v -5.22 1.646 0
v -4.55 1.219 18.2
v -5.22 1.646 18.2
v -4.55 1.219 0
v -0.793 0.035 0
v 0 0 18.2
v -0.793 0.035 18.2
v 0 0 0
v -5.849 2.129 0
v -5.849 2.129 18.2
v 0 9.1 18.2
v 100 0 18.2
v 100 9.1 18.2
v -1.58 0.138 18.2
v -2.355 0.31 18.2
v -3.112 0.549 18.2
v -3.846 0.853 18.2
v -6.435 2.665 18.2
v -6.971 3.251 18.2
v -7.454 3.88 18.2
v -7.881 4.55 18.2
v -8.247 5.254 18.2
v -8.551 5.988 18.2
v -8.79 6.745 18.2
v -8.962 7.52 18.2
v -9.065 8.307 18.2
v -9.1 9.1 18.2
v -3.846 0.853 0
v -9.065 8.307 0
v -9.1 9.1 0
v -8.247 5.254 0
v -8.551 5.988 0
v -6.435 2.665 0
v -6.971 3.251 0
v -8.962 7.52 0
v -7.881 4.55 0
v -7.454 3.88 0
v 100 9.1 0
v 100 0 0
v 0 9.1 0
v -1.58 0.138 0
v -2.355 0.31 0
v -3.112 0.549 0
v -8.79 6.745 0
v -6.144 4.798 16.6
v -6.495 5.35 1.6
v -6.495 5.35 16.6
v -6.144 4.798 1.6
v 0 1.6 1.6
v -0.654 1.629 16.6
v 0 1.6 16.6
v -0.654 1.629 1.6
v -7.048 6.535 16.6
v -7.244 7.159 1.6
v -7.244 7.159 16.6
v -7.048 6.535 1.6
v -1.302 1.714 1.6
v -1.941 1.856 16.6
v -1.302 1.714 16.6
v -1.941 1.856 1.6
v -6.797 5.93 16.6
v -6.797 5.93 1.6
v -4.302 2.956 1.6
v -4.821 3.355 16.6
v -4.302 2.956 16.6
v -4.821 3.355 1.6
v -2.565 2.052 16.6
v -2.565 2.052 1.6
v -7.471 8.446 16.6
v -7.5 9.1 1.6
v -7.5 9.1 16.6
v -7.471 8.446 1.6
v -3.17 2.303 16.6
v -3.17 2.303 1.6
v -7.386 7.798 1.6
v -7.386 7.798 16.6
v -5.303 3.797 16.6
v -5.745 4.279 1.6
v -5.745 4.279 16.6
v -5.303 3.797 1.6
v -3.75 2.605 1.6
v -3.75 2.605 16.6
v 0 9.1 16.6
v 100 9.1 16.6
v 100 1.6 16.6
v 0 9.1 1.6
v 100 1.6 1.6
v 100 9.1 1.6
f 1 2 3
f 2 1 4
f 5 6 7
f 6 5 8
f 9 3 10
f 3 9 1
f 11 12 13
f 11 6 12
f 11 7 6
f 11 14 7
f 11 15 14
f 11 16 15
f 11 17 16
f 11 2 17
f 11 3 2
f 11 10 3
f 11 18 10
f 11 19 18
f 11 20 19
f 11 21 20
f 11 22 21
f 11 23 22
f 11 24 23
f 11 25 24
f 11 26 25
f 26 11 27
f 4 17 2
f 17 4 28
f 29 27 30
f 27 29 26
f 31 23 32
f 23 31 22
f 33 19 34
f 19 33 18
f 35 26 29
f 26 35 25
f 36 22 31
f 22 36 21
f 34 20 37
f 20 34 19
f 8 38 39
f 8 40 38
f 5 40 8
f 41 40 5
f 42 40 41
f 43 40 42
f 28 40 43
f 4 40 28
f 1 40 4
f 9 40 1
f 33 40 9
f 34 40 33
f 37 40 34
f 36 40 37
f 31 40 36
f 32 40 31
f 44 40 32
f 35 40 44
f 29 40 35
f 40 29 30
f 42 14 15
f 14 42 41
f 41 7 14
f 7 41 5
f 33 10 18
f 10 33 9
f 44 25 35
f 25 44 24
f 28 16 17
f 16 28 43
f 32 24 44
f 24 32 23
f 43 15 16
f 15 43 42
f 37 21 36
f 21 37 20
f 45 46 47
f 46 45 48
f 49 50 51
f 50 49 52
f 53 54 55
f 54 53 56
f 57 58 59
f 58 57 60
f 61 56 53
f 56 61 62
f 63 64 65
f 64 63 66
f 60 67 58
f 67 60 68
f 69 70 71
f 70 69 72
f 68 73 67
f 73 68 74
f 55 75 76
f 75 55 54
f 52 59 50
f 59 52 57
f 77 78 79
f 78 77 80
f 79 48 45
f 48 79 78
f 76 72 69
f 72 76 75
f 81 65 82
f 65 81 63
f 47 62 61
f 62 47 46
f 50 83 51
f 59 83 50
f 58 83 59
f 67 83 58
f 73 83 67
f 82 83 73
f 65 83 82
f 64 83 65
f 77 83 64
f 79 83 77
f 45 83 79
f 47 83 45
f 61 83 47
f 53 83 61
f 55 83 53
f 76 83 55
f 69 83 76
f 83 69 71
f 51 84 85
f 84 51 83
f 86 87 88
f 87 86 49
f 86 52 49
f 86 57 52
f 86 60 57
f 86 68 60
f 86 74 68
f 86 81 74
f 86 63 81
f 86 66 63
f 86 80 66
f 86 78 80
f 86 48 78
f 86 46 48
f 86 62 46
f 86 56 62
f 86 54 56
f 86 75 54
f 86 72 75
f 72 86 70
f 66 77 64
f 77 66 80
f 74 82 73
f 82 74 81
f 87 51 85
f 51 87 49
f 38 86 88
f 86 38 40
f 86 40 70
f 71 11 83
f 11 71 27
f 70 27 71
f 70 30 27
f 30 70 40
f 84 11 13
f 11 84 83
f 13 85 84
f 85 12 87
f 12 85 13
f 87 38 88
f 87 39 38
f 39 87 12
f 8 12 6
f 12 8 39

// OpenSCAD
$fn=72;

h=15;
t=1.6;
d=h/2;

cube([100, d+t, t]);

translate([0,0,t])
cube([100, t, h]);

translate([0,0,h+t])
cube([100, d+t, t]);


module brett()
{
color("red")
translate([0,t,t])
cube([200,200,h]);
}

module cut()
{
color("yellow")
translate([-d-t,t+d,0])
cube([200,200,h+t+t]);
}


difference()
{
c1=d+t;
translate([0,c1,0])
cylinder(h+t+t, r=c1);

translate([0,d+t,t])
cylinder(h, r=d);

brett();
    cut();
}
